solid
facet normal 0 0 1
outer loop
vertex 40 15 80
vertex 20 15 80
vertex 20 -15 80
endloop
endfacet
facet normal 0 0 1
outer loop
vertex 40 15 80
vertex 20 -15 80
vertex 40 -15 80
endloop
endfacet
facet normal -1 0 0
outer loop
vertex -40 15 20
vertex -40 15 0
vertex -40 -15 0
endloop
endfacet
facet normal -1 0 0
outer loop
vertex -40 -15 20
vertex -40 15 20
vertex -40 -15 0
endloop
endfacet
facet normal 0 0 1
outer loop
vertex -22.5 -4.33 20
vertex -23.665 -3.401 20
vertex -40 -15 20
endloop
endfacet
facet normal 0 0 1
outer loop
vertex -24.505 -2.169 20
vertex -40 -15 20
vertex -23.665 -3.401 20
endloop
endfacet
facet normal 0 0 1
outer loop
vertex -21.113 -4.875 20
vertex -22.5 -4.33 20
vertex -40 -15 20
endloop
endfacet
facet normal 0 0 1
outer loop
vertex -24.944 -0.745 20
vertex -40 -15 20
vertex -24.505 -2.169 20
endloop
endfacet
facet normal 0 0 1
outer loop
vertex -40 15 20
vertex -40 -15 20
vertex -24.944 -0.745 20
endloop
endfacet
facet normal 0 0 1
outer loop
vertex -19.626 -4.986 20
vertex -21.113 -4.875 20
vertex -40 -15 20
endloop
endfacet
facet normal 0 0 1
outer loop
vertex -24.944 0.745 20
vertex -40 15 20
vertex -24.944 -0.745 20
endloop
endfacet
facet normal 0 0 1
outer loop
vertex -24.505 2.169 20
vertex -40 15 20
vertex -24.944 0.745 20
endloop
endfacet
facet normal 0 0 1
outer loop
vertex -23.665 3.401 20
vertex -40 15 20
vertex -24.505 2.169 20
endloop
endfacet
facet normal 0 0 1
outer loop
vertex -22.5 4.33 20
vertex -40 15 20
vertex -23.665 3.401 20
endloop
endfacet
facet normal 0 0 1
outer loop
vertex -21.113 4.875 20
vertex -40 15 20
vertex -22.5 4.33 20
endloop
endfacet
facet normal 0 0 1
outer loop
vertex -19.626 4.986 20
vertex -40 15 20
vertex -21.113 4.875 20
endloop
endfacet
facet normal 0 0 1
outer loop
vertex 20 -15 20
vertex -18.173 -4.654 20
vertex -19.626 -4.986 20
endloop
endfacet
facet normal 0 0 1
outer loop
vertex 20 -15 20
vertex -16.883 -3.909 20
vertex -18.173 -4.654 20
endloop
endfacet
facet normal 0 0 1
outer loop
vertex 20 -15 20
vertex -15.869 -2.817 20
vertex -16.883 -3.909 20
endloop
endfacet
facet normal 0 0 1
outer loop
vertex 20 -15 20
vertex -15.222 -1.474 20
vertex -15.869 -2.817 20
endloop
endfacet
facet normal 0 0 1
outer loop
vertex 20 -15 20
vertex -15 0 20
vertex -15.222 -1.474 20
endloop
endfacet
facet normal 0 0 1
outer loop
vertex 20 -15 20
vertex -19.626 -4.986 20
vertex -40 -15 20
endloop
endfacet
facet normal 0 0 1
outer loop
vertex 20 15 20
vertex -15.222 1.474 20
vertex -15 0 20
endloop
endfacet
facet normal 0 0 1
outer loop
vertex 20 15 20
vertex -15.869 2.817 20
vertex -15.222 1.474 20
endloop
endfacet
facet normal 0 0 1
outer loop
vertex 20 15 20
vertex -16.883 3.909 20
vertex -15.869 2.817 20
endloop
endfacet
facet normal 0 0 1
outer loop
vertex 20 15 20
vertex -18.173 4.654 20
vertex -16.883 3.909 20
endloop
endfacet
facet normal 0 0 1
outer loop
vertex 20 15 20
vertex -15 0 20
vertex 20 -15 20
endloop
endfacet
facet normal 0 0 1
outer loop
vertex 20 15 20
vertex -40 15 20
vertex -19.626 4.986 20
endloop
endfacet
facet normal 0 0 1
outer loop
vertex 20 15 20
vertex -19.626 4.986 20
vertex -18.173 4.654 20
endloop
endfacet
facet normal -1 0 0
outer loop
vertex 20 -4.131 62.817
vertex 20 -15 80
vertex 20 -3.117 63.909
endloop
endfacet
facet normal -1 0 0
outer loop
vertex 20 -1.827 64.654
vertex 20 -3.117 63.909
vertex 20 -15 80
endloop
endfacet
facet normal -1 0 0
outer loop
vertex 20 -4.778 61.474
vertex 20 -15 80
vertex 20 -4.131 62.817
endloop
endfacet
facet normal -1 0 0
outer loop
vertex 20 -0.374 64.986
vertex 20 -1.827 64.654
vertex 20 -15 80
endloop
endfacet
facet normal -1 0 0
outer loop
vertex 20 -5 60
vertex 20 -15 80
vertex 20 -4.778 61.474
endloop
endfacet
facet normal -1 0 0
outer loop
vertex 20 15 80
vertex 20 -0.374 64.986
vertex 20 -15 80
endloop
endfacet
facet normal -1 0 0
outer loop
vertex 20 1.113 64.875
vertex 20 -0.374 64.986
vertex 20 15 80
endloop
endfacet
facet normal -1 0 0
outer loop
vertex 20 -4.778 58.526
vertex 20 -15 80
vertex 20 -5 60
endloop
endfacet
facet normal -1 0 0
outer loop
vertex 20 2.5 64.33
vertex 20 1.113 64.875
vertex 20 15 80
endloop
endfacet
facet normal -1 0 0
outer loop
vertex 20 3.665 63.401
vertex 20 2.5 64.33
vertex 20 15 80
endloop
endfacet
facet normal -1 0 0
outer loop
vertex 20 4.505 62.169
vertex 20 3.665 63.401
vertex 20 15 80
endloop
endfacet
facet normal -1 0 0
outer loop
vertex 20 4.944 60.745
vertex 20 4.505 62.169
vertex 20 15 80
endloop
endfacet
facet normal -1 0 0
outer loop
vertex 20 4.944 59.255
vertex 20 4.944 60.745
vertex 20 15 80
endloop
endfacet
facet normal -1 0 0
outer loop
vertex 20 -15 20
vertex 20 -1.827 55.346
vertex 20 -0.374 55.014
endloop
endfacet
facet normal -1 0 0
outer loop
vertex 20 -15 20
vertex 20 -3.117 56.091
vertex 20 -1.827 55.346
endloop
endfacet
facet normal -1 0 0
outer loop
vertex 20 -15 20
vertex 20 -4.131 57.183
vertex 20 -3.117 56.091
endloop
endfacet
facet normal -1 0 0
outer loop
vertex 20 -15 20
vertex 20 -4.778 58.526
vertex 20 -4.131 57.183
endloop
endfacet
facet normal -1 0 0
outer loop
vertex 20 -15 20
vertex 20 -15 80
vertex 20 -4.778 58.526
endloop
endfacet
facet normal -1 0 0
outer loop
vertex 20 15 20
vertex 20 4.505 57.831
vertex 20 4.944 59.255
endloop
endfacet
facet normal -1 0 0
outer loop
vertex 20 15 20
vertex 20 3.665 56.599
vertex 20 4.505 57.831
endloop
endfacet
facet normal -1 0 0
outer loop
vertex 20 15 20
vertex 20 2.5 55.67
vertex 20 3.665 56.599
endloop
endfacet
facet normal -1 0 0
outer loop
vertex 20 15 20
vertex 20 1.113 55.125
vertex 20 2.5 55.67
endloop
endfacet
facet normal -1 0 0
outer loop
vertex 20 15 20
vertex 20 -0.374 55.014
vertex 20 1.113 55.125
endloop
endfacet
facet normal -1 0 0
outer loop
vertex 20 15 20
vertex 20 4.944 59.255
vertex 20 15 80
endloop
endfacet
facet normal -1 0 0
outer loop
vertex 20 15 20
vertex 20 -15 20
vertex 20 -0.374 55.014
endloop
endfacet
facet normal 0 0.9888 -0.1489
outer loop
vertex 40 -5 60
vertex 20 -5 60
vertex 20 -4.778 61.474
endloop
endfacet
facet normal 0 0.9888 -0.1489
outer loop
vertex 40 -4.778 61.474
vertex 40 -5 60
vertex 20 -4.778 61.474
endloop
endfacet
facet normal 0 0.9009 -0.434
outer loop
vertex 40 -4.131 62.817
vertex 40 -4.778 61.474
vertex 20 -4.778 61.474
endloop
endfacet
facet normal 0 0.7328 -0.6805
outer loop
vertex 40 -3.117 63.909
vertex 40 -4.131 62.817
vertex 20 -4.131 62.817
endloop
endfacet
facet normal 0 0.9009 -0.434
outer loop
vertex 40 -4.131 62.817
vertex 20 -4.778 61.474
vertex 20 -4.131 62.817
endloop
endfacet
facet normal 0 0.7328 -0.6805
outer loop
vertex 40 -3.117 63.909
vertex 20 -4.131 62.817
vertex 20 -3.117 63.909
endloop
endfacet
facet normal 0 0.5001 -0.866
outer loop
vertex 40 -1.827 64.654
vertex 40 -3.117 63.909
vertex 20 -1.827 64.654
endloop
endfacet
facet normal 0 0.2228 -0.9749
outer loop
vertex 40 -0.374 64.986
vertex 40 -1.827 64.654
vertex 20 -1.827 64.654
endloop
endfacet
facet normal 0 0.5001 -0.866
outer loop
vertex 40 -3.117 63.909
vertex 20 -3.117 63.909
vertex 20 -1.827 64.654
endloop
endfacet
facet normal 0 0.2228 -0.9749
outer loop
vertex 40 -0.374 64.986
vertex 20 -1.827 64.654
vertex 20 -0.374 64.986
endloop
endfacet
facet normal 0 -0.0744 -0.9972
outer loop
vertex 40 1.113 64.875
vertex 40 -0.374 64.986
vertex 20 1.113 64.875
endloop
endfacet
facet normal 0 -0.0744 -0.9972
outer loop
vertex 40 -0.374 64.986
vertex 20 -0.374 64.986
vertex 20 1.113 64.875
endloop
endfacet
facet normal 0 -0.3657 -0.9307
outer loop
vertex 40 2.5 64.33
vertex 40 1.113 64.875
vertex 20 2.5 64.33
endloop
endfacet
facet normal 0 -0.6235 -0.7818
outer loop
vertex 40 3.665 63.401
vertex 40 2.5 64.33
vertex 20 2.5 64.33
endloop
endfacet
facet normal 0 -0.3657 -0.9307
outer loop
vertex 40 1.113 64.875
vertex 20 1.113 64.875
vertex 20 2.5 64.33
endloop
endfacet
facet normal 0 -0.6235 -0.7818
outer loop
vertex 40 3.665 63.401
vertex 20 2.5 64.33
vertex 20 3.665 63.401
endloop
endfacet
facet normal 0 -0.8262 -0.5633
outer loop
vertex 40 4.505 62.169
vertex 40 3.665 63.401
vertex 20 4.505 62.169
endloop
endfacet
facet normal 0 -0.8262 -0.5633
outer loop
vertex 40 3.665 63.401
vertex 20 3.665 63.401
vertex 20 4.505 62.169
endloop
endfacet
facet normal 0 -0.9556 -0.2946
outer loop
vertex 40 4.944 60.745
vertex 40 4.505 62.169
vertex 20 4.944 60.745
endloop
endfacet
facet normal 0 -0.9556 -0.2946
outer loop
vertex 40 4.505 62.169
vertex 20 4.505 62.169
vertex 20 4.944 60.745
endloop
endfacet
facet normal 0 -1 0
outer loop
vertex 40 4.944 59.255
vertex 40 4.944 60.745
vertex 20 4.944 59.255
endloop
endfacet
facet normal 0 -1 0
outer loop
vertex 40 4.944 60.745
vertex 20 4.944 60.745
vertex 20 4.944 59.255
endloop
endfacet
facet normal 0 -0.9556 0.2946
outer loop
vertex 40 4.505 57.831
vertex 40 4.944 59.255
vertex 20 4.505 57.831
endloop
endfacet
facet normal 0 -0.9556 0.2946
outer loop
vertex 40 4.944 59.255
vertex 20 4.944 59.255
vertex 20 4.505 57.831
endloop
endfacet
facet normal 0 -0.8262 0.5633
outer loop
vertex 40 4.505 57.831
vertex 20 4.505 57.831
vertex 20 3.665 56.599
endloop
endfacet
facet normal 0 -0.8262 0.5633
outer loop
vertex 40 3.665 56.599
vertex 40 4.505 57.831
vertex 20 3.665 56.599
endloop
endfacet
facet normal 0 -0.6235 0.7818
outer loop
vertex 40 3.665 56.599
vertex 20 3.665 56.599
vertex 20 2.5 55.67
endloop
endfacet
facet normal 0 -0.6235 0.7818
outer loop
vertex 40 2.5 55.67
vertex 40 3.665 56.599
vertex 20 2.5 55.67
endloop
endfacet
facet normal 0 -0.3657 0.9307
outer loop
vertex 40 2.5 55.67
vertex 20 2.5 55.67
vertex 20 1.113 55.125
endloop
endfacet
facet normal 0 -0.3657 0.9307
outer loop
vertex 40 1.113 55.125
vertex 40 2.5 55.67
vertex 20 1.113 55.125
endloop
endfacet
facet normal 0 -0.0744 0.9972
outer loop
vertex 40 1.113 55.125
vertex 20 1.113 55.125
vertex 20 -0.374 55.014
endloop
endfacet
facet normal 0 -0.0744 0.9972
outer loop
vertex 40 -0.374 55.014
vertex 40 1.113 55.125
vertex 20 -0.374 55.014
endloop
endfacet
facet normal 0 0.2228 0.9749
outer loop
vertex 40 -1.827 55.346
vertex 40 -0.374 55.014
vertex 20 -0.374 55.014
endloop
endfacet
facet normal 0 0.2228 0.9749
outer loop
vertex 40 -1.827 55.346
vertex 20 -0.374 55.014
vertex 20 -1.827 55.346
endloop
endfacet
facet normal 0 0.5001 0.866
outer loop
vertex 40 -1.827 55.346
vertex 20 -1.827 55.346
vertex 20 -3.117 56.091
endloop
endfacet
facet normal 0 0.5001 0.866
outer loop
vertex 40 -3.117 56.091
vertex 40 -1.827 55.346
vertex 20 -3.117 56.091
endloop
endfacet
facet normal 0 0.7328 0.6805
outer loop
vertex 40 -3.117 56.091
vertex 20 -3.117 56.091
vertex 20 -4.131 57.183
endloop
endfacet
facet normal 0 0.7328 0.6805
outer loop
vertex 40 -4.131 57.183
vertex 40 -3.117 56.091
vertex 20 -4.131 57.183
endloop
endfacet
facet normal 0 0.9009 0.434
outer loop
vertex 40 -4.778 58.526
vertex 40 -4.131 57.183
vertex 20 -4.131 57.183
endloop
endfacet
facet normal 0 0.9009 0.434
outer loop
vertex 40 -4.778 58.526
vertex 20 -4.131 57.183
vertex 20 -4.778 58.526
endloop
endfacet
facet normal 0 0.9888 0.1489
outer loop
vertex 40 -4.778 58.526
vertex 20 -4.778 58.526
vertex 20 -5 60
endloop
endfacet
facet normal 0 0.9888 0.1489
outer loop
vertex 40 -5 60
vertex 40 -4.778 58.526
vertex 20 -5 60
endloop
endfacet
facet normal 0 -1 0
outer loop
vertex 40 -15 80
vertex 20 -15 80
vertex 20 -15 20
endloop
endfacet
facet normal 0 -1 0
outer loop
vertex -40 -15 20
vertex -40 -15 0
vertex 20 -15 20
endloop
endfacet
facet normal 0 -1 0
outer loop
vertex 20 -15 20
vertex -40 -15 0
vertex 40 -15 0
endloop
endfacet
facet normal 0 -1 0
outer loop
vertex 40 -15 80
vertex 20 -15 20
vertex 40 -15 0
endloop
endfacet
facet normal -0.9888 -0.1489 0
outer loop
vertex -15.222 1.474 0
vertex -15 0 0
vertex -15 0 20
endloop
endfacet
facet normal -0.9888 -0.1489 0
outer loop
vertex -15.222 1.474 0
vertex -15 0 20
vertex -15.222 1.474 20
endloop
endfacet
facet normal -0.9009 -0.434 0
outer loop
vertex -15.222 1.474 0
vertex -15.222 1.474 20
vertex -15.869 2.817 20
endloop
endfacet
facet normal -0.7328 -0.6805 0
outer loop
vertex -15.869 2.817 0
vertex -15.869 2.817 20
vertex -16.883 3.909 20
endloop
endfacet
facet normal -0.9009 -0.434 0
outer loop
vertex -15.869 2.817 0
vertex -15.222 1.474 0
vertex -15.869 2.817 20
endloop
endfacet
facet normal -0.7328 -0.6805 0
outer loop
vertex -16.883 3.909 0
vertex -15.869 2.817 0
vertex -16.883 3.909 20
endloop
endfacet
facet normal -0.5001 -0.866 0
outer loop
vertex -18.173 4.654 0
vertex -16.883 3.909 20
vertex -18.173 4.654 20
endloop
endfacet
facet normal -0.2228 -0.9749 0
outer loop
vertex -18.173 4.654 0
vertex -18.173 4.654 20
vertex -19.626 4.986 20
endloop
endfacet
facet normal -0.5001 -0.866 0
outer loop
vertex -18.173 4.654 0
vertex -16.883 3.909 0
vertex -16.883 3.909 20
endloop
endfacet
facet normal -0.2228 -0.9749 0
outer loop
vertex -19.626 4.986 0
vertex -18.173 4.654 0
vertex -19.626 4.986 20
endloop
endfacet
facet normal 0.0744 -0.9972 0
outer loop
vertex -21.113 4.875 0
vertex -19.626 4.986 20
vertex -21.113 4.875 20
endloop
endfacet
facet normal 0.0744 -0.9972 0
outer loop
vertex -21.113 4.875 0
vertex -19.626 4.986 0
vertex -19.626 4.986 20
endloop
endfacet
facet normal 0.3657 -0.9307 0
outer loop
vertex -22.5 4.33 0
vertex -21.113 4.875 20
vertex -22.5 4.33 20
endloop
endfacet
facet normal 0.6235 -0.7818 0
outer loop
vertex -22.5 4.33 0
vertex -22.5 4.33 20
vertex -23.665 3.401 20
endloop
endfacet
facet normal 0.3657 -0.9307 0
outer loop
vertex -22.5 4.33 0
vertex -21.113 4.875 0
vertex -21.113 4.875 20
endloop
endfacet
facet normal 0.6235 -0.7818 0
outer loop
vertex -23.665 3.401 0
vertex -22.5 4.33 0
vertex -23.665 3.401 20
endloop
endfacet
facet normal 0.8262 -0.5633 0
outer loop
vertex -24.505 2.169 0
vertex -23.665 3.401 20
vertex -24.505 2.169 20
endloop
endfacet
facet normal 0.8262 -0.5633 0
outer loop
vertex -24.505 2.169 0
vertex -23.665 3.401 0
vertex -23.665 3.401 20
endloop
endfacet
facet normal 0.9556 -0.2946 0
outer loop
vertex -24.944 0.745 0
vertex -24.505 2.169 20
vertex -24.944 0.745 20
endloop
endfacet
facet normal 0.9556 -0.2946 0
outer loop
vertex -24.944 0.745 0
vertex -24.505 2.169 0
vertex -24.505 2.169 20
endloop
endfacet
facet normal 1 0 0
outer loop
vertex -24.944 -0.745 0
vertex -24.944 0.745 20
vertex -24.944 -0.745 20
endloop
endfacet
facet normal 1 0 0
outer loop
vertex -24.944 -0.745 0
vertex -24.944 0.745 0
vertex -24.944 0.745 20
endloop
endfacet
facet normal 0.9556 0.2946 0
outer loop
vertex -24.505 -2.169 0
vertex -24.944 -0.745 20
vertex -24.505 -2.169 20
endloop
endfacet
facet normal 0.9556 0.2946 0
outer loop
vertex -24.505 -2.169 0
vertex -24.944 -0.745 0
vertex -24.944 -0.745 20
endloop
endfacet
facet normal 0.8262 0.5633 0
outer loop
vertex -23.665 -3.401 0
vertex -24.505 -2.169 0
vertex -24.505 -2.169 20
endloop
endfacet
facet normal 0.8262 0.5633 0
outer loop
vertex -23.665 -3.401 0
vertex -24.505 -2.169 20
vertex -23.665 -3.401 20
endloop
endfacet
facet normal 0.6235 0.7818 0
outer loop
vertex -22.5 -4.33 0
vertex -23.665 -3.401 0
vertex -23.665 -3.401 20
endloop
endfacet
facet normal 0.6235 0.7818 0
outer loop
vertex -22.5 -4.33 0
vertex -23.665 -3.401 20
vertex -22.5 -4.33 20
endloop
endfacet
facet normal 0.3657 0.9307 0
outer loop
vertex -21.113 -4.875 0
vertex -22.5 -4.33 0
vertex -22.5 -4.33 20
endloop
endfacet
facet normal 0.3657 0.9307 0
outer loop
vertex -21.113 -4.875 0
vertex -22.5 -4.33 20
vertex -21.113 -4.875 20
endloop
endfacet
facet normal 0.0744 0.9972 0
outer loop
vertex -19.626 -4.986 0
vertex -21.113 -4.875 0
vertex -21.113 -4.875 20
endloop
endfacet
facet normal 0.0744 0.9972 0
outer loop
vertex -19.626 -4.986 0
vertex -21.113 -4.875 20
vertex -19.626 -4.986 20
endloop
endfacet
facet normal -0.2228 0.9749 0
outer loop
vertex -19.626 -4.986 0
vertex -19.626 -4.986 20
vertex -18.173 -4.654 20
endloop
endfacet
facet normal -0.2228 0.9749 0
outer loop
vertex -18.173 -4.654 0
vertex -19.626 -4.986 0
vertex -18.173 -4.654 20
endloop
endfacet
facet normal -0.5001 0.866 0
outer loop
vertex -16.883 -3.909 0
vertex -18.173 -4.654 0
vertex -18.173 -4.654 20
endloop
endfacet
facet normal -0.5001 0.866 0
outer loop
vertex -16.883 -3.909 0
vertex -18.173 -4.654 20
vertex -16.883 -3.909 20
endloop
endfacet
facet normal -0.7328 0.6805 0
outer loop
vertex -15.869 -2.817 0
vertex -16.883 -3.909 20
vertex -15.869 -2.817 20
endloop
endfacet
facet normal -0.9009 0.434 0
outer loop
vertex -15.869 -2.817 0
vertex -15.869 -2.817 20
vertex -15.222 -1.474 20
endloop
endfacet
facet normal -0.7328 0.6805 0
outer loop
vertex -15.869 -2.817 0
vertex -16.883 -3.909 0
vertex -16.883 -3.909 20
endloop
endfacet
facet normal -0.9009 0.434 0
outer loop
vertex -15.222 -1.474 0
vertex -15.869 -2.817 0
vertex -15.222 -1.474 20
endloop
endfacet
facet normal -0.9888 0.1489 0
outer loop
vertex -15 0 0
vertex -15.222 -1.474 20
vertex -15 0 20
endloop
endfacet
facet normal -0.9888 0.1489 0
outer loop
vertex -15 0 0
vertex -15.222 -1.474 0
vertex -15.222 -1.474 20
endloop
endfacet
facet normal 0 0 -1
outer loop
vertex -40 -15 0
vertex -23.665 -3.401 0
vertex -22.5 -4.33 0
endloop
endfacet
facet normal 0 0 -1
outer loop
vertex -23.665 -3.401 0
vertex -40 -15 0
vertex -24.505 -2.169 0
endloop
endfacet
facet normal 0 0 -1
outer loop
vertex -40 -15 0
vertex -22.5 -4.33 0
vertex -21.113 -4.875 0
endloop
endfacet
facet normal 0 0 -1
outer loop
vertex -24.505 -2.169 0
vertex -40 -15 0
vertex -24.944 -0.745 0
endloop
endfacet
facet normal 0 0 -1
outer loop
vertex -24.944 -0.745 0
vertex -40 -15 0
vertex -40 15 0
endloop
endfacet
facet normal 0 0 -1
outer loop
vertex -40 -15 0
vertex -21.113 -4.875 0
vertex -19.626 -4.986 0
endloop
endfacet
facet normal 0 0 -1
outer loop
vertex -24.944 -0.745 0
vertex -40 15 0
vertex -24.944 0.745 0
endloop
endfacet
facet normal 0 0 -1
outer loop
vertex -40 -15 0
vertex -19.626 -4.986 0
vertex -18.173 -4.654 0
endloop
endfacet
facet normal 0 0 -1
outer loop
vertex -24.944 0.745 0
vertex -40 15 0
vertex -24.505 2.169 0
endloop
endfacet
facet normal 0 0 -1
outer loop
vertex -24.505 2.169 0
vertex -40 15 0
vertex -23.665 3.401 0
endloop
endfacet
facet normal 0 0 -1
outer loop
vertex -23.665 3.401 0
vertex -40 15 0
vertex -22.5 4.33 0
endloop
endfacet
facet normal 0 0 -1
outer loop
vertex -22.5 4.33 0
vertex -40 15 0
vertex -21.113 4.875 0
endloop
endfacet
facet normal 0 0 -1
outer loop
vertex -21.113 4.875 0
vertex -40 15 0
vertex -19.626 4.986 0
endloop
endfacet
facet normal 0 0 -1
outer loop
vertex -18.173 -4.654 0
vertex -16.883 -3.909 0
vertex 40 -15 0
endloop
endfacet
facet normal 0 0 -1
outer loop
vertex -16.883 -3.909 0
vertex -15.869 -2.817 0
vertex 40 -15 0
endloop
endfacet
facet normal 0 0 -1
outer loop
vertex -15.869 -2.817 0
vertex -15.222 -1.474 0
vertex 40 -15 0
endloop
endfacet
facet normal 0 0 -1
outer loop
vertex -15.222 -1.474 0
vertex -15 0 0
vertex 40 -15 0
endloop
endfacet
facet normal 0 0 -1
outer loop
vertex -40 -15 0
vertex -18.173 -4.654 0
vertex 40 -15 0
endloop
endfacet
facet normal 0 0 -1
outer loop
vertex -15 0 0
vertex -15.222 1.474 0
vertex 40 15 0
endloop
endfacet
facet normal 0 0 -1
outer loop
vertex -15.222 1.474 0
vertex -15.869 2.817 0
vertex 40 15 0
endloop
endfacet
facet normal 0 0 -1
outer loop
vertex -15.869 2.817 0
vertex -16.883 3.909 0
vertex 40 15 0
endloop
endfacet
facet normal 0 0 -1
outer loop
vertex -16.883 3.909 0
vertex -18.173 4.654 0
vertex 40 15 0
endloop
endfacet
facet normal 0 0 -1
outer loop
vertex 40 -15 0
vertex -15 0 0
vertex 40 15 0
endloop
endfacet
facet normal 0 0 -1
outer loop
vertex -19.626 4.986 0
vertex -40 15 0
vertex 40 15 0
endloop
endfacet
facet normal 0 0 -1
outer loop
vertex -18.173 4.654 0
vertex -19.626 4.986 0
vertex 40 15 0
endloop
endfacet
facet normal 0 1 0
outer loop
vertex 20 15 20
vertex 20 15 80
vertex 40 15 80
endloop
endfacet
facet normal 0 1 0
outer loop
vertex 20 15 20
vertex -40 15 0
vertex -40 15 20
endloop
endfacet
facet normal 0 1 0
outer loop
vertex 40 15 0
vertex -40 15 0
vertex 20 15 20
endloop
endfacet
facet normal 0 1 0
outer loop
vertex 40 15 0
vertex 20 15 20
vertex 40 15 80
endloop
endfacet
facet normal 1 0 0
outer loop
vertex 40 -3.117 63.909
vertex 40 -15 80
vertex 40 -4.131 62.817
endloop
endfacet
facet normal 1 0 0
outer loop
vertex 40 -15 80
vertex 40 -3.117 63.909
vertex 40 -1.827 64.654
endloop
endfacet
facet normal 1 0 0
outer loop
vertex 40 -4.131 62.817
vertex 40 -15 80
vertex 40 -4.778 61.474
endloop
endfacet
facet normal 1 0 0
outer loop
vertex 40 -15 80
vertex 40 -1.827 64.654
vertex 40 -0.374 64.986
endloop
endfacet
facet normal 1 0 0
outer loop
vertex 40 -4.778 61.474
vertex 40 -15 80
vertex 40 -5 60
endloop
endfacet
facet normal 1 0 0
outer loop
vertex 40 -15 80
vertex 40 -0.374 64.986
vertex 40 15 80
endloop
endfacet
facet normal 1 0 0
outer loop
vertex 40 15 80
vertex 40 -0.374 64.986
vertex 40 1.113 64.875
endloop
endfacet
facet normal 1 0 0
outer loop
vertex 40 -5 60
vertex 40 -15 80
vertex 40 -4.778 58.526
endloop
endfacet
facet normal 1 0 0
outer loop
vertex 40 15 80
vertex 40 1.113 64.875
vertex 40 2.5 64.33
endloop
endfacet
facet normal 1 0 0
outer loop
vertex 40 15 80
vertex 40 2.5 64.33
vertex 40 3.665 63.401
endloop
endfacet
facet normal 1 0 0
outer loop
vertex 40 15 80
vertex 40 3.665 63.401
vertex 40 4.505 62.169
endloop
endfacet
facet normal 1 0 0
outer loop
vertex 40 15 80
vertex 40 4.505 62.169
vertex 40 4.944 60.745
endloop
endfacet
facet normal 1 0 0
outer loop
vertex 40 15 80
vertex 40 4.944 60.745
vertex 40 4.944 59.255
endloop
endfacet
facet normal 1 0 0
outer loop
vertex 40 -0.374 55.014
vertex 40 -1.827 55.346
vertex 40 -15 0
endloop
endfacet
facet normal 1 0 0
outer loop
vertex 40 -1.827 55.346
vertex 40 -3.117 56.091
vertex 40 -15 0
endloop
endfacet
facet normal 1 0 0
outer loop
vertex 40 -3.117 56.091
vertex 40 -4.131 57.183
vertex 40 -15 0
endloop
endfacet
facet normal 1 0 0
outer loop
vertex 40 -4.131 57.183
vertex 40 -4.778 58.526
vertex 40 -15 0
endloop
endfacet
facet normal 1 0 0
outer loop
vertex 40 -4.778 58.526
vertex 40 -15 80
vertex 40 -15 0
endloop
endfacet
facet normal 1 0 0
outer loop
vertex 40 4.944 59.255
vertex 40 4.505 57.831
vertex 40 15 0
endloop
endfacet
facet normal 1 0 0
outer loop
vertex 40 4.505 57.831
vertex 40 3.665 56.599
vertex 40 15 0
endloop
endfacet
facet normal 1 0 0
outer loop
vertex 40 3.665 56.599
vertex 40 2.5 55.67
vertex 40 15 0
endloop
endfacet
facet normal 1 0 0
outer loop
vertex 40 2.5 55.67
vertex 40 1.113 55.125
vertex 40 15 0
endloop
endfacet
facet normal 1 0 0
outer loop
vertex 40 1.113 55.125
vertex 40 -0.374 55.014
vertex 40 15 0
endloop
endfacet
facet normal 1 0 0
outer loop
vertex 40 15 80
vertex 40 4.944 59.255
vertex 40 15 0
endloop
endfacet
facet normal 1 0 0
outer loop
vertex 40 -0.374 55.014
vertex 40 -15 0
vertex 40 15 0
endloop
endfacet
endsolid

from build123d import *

# Parameters (mm, degrees)
SKETCH1_R           = 5
BOSS_EXTRUDE1_DEPTH = 20
SKETCH2_W           = 20
SKETCH2_H           = 30
BOSS_EXTRUDE2_DEPTH = 60
SKETCH3_R           = 5
CUT_EXTRUDE1_DEPTH  = 60


with BuildPart() as part:
    # Sketch1 → Boss-Extrude1 (new body)
    with BuildSketch(Plane.XY):
        Polygon((-20, 15), (-40, 15), (-40, -15), (40, -15), (40, 15), align=None)
        with Locations((-20, 0)):
            Circle(SKETCH1_R, mode=Mode.SUBTRACT)
    extrude(amount=BOSS_EXTRUDE1_DEPTH)

    # Sketch2 → Boss-Extrude2 (add)
    with BuildSketch(Plane.XY.offset(20)):
        with Locations((30, 0)):
            Rectangle(SKETCH2_W, SKETCH2_H)
    extrude(amount=BOSS_EXTRUDE2_DEPTH)

    # Sketch3 → Cut-Extrude1 (cut)
    with BuildSketch(Plane.ZY.offset(-20)):
        with Locations(Location((60, 0, 0), (0, 0, 270))):
            Circle(SKETCH3_R)
    extrude(amount=-CUT_EXTRUDE1_DEPTH, mode=Mode.SUBTRACT)


solid = part.part
